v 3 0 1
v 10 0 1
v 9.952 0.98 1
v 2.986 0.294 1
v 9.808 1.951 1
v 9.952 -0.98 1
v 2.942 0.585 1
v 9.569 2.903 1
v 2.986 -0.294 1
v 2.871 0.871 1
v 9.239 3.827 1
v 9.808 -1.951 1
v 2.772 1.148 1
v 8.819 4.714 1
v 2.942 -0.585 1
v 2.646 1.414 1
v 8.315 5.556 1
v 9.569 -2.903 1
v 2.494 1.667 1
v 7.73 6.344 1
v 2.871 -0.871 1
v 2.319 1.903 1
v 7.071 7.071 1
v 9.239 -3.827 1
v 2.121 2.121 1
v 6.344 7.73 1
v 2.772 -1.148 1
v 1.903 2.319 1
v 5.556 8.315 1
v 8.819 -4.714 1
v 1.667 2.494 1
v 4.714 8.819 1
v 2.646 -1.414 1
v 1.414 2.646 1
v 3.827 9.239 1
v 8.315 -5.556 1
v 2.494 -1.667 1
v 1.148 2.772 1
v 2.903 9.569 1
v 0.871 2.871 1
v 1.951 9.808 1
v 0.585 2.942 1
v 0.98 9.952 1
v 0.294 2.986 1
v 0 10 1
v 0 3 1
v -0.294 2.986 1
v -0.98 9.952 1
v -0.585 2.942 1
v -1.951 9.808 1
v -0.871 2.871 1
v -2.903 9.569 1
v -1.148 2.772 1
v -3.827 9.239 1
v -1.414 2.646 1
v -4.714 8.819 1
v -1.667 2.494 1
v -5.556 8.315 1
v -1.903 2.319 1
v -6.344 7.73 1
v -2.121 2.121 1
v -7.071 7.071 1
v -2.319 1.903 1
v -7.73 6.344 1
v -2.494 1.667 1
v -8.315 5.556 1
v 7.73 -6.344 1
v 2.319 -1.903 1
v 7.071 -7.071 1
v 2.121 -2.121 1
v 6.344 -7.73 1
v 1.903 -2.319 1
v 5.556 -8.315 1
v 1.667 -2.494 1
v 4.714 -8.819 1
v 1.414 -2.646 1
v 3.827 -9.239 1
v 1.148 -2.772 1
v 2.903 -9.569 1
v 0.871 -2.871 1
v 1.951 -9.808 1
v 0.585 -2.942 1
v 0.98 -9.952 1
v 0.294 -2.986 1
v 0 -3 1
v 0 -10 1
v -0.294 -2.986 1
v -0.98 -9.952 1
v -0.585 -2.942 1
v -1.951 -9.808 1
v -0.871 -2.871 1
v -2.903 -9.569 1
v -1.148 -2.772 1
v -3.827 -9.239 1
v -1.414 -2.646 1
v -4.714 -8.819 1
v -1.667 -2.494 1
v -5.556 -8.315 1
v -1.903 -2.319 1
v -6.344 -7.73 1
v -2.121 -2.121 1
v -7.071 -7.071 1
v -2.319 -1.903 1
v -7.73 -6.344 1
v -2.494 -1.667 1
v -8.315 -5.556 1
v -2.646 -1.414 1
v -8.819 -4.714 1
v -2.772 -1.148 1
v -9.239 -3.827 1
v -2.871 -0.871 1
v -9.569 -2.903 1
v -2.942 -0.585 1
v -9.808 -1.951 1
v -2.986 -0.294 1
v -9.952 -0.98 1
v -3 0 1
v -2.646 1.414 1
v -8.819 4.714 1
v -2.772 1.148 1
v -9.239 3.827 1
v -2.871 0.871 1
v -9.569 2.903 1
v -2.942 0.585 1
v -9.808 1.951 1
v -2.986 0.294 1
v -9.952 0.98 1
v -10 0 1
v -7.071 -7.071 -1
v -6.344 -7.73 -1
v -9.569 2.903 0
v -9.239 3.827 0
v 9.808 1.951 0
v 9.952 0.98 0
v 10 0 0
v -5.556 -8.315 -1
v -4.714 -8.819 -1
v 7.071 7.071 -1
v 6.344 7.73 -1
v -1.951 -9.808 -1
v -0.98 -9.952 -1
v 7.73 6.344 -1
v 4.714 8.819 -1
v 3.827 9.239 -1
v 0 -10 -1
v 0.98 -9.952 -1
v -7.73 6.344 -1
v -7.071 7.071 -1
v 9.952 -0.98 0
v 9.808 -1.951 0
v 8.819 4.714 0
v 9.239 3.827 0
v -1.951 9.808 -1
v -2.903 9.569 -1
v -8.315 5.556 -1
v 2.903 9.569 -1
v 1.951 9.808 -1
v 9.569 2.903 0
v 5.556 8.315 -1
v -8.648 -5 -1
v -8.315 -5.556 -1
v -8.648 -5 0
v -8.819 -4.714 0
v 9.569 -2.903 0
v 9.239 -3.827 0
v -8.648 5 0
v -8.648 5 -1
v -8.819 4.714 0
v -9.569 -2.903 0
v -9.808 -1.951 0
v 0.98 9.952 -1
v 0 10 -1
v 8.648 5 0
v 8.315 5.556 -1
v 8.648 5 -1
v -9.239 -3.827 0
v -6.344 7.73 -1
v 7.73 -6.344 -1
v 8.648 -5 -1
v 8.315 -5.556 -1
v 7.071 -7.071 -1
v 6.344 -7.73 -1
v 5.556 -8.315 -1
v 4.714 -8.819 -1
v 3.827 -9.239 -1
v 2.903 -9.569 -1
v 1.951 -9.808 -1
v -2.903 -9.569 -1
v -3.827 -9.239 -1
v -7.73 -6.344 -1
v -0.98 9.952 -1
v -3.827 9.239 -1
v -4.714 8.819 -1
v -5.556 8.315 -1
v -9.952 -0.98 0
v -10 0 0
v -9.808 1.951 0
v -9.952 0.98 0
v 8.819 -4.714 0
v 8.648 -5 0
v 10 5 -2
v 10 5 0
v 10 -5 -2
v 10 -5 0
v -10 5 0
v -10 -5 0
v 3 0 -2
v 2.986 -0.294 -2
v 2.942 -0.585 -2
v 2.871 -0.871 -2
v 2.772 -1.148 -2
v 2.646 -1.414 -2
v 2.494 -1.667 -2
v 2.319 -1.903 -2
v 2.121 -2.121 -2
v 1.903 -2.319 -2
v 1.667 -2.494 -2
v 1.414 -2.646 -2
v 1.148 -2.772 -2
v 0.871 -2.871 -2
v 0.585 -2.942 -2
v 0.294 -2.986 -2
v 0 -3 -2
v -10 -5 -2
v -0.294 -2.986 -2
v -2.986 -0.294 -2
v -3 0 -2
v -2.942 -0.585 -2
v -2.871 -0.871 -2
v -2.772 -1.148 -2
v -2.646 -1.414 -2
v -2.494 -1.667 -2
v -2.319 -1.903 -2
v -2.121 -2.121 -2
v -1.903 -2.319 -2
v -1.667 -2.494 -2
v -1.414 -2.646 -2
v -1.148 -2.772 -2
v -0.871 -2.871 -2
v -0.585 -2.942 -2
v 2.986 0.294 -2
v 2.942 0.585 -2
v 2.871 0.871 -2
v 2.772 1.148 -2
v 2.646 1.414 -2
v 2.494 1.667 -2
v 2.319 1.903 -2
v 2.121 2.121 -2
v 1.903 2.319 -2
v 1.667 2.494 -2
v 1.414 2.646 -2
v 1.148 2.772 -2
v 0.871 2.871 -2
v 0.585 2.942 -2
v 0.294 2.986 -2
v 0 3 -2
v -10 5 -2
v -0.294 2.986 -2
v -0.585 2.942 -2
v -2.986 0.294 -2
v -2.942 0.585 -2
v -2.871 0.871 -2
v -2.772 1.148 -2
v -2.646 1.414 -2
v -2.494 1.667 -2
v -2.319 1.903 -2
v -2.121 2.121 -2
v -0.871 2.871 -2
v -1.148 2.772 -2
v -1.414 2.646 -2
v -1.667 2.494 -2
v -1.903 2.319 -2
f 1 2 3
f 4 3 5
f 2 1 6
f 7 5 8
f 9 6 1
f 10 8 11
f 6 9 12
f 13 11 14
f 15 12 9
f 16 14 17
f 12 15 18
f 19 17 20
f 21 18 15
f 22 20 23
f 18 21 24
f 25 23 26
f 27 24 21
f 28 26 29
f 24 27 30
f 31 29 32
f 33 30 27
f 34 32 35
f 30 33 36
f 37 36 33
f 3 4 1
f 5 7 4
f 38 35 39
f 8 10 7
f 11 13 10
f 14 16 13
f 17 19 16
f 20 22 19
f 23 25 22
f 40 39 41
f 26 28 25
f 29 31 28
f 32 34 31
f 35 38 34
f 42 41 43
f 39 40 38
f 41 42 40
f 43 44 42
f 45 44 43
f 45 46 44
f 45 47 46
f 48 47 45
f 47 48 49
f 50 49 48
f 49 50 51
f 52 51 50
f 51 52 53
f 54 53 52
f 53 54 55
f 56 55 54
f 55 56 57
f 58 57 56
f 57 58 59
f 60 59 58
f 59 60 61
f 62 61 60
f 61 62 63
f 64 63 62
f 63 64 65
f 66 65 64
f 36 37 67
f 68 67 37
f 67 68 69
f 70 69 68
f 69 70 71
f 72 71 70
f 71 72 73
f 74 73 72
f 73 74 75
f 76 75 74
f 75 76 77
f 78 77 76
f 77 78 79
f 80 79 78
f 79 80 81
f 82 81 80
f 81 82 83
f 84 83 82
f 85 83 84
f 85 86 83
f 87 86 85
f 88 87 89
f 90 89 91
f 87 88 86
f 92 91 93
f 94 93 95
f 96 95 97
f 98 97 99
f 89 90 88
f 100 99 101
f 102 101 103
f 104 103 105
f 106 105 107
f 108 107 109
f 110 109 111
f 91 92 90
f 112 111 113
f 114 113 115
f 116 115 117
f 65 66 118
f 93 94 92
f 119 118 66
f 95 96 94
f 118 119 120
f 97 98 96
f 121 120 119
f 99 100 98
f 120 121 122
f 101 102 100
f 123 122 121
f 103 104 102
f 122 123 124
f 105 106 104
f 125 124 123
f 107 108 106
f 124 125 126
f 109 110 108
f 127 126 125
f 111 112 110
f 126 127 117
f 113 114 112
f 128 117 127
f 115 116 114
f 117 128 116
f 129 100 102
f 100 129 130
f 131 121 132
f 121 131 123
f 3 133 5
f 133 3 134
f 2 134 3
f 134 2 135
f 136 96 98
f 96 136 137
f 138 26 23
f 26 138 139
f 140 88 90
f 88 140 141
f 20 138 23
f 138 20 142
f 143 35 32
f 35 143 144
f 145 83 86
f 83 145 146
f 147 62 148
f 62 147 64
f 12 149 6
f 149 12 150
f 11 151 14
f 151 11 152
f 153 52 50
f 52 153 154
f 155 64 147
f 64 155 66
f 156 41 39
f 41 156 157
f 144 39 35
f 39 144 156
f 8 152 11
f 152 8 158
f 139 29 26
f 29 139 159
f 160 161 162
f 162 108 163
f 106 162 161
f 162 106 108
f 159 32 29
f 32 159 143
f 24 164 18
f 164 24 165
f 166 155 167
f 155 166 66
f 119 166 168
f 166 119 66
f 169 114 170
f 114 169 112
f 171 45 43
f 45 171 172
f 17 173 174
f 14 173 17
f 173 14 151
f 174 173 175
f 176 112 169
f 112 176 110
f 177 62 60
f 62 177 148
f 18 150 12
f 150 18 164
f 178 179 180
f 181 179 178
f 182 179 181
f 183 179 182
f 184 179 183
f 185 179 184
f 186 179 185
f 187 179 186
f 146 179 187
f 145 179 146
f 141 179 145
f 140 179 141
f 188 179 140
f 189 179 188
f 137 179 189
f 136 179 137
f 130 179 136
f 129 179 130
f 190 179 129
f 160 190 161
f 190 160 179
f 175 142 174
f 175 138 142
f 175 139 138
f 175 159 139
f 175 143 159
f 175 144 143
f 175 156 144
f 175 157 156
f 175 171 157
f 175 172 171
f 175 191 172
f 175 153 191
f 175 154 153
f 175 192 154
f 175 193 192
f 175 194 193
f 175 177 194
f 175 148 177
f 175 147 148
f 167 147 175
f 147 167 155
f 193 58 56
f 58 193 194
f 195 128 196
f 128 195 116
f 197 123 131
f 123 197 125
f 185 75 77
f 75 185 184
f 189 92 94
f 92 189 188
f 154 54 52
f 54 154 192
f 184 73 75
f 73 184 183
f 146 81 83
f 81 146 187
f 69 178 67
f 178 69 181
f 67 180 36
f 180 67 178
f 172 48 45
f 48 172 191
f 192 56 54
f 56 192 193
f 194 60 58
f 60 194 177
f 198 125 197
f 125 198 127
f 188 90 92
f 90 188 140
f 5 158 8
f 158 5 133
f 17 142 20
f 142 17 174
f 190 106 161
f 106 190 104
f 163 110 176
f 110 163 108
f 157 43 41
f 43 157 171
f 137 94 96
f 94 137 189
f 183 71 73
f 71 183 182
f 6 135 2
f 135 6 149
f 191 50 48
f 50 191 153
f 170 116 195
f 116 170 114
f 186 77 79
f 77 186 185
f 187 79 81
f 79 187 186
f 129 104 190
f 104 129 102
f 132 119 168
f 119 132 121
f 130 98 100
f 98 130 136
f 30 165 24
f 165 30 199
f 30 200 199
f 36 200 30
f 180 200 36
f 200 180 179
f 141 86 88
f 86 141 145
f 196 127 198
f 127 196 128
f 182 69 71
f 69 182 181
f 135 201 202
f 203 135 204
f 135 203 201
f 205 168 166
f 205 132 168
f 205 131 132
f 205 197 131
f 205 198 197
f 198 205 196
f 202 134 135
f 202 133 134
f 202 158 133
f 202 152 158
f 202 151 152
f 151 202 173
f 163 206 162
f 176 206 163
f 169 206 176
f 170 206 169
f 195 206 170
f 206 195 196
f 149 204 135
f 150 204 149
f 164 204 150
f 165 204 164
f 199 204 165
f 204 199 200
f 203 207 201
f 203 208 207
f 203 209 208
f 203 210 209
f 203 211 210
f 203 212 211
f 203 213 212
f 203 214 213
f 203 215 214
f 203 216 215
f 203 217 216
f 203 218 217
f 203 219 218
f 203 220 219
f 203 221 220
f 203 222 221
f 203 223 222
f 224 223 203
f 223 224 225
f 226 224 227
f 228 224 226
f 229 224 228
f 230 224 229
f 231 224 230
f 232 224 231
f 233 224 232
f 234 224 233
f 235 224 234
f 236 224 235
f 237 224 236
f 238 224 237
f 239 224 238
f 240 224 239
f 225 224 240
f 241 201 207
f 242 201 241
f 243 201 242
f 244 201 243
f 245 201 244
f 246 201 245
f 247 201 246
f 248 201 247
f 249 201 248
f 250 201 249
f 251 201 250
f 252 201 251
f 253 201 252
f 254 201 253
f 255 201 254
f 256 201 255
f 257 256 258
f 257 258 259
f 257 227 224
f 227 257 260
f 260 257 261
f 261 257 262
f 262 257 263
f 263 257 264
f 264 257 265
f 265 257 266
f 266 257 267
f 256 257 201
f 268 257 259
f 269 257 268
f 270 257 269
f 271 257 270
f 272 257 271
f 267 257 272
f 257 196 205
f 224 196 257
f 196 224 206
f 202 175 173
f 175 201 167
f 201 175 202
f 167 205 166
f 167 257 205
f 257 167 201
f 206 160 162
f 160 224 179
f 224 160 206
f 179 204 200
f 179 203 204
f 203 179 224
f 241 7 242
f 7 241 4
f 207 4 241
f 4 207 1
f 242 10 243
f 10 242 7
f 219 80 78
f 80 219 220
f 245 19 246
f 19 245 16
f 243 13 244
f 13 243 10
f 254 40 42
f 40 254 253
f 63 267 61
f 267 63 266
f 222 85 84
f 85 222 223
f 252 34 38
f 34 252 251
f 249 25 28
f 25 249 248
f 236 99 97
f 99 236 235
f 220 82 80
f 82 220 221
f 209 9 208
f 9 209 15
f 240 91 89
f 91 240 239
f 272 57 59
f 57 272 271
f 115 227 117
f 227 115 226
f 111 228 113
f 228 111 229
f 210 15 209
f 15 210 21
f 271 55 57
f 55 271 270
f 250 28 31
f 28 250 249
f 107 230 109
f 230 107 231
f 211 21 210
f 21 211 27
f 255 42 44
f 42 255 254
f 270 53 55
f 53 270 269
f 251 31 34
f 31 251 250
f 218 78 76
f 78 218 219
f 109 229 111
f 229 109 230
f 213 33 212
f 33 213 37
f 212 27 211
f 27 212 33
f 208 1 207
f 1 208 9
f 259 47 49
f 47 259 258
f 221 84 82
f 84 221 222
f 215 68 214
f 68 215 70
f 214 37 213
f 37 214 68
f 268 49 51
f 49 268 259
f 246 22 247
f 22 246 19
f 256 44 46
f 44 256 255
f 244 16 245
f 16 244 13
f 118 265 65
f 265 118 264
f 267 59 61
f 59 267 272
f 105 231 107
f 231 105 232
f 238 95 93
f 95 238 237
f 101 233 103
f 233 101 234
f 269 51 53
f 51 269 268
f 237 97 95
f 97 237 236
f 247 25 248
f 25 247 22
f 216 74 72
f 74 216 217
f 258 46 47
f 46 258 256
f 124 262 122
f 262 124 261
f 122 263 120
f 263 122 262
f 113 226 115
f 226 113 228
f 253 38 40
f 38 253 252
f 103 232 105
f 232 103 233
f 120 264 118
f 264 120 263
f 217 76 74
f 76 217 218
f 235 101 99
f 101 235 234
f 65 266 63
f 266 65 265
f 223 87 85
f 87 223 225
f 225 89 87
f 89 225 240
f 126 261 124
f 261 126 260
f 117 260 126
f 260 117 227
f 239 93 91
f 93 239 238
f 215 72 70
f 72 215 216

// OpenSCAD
module ring_terminal() {
    difference() {
        union() {
            // Main body of the terminal
            translate([0, 0, -1])
                cylinder(h=2, r=5, $fn=64);
            // The ring part
            translate([0, 0, -1])
                cylinder(h=2, r=10, $fn=64);
            // The wire crimping section
            translate([0, 0, -1])
                cube([20, 10, 2], center=true);
        }
        // Hole in the ring
        translate([0, 0, -2])
            cylinder(h=4, r=3, $fn=64);
    }
}

ring_terminal();
